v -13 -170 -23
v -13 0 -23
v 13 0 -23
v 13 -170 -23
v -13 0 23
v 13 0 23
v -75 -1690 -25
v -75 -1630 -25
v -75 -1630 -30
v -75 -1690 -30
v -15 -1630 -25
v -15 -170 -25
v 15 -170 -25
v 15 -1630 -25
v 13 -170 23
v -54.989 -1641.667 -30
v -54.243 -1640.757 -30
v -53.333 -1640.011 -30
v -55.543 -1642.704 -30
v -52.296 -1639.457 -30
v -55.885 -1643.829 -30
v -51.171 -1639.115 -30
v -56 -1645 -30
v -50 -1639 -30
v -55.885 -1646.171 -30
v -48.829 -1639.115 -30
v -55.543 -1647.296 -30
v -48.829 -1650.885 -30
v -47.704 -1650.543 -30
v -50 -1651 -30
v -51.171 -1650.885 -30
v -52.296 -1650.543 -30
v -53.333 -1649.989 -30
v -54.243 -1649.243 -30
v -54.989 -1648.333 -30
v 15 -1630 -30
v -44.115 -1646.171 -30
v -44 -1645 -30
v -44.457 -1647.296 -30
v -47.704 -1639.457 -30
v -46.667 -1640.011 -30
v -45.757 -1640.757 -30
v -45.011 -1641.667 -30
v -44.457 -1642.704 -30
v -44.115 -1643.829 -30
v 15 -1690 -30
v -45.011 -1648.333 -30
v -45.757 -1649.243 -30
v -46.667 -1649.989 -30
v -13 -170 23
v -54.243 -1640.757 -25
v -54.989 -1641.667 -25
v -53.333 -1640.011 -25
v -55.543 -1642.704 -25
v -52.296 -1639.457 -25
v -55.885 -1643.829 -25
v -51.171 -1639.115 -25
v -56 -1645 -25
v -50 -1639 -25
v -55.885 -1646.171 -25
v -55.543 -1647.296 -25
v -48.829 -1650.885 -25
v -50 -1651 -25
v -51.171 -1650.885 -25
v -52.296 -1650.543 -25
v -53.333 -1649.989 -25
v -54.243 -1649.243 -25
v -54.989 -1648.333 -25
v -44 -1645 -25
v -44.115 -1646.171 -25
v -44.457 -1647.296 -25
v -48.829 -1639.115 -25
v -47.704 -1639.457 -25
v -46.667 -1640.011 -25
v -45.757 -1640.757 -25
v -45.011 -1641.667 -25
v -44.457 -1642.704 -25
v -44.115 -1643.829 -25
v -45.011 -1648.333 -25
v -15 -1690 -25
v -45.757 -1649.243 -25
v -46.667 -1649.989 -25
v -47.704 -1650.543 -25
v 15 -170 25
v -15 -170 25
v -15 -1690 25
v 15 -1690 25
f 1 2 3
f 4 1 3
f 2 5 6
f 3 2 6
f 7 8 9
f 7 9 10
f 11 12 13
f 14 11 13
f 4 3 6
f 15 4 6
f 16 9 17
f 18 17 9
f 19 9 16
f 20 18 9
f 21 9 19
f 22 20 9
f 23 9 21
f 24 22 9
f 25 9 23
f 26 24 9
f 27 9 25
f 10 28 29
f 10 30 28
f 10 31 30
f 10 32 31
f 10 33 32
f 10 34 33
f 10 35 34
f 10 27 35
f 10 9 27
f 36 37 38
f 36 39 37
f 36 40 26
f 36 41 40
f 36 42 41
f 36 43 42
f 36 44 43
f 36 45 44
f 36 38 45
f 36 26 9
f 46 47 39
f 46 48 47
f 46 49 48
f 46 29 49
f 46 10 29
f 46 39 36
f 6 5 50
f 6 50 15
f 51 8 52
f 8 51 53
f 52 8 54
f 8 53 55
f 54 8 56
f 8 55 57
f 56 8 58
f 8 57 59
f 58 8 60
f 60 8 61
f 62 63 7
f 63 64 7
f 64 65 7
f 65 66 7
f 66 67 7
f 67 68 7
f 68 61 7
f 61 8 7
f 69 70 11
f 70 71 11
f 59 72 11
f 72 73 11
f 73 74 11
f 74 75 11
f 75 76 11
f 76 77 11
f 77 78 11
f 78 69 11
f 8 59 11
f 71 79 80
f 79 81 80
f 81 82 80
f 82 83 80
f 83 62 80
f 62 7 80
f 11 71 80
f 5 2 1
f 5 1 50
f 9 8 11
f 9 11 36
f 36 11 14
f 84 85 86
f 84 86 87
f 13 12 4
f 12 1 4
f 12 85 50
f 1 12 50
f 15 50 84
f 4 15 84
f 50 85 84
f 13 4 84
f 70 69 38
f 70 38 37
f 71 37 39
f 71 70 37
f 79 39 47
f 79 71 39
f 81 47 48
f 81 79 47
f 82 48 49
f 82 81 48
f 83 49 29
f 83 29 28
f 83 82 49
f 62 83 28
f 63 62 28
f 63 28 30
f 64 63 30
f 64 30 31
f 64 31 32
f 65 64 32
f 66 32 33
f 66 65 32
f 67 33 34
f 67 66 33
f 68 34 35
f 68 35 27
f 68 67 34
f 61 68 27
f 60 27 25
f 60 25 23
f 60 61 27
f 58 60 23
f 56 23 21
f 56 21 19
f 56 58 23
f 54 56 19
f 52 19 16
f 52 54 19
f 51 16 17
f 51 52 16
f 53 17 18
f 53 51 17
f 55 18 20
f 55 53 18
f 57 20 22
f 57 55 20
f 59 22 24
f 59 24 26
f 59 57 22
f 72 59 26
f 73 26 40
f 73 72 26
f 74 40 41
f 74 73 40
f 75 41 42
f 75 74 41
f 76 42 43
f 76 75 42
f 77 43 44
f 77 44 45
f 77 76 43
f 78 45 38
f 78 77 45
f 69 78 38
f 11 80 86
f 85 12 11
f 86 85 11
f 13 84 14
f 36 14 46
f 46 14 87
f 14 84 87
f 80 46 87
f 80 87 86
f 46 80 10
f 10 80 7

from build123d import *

# Parameters (mm, degrees)
F0_W     = 26
F0_H     = 46
F1_DEPTH = 170
F2_W     = 30
F2_H     = 50
F3_DEPTH = 1520
F4_W     = 60
F4_H     = 60
F4_R     = 6
F5_DEPTH = 5


with BuildPart() as f1:
    # F0 (on Front) → F1 (new body)
    with BuildSketch(Plane.XZ):
        Rectangle(F0_W, F0_H)
    extrude(amount=F1_DEPTH)

    # F2 (on face) → F3 (join)
    with BuildSketch(Plane.XZ.offset(170)):
        Rectangle(F2_W, F2_H)
    extrude(amount=F3_DEPTH)

    # F4 (on face) → F5 (join)
    with BuildSketch(Plane(origin=(0, 0, -25), x_dir=(1, 0, 0), z_dir=(0, 0, -1))):
        with Locations((-45, 1660)):
            Rectangle(F4_W, F4_H)
        with Locations((-50, 1645)):
            Circle(F4_R, mode=Mode.SUBTRACT)
        Polygon((15, 1690), (-15, 1690), (-15, 1630), (15, 1630), (15, 1645), align=None)
    extrude(amount=F5_DEPTH)


solid = f1.part
